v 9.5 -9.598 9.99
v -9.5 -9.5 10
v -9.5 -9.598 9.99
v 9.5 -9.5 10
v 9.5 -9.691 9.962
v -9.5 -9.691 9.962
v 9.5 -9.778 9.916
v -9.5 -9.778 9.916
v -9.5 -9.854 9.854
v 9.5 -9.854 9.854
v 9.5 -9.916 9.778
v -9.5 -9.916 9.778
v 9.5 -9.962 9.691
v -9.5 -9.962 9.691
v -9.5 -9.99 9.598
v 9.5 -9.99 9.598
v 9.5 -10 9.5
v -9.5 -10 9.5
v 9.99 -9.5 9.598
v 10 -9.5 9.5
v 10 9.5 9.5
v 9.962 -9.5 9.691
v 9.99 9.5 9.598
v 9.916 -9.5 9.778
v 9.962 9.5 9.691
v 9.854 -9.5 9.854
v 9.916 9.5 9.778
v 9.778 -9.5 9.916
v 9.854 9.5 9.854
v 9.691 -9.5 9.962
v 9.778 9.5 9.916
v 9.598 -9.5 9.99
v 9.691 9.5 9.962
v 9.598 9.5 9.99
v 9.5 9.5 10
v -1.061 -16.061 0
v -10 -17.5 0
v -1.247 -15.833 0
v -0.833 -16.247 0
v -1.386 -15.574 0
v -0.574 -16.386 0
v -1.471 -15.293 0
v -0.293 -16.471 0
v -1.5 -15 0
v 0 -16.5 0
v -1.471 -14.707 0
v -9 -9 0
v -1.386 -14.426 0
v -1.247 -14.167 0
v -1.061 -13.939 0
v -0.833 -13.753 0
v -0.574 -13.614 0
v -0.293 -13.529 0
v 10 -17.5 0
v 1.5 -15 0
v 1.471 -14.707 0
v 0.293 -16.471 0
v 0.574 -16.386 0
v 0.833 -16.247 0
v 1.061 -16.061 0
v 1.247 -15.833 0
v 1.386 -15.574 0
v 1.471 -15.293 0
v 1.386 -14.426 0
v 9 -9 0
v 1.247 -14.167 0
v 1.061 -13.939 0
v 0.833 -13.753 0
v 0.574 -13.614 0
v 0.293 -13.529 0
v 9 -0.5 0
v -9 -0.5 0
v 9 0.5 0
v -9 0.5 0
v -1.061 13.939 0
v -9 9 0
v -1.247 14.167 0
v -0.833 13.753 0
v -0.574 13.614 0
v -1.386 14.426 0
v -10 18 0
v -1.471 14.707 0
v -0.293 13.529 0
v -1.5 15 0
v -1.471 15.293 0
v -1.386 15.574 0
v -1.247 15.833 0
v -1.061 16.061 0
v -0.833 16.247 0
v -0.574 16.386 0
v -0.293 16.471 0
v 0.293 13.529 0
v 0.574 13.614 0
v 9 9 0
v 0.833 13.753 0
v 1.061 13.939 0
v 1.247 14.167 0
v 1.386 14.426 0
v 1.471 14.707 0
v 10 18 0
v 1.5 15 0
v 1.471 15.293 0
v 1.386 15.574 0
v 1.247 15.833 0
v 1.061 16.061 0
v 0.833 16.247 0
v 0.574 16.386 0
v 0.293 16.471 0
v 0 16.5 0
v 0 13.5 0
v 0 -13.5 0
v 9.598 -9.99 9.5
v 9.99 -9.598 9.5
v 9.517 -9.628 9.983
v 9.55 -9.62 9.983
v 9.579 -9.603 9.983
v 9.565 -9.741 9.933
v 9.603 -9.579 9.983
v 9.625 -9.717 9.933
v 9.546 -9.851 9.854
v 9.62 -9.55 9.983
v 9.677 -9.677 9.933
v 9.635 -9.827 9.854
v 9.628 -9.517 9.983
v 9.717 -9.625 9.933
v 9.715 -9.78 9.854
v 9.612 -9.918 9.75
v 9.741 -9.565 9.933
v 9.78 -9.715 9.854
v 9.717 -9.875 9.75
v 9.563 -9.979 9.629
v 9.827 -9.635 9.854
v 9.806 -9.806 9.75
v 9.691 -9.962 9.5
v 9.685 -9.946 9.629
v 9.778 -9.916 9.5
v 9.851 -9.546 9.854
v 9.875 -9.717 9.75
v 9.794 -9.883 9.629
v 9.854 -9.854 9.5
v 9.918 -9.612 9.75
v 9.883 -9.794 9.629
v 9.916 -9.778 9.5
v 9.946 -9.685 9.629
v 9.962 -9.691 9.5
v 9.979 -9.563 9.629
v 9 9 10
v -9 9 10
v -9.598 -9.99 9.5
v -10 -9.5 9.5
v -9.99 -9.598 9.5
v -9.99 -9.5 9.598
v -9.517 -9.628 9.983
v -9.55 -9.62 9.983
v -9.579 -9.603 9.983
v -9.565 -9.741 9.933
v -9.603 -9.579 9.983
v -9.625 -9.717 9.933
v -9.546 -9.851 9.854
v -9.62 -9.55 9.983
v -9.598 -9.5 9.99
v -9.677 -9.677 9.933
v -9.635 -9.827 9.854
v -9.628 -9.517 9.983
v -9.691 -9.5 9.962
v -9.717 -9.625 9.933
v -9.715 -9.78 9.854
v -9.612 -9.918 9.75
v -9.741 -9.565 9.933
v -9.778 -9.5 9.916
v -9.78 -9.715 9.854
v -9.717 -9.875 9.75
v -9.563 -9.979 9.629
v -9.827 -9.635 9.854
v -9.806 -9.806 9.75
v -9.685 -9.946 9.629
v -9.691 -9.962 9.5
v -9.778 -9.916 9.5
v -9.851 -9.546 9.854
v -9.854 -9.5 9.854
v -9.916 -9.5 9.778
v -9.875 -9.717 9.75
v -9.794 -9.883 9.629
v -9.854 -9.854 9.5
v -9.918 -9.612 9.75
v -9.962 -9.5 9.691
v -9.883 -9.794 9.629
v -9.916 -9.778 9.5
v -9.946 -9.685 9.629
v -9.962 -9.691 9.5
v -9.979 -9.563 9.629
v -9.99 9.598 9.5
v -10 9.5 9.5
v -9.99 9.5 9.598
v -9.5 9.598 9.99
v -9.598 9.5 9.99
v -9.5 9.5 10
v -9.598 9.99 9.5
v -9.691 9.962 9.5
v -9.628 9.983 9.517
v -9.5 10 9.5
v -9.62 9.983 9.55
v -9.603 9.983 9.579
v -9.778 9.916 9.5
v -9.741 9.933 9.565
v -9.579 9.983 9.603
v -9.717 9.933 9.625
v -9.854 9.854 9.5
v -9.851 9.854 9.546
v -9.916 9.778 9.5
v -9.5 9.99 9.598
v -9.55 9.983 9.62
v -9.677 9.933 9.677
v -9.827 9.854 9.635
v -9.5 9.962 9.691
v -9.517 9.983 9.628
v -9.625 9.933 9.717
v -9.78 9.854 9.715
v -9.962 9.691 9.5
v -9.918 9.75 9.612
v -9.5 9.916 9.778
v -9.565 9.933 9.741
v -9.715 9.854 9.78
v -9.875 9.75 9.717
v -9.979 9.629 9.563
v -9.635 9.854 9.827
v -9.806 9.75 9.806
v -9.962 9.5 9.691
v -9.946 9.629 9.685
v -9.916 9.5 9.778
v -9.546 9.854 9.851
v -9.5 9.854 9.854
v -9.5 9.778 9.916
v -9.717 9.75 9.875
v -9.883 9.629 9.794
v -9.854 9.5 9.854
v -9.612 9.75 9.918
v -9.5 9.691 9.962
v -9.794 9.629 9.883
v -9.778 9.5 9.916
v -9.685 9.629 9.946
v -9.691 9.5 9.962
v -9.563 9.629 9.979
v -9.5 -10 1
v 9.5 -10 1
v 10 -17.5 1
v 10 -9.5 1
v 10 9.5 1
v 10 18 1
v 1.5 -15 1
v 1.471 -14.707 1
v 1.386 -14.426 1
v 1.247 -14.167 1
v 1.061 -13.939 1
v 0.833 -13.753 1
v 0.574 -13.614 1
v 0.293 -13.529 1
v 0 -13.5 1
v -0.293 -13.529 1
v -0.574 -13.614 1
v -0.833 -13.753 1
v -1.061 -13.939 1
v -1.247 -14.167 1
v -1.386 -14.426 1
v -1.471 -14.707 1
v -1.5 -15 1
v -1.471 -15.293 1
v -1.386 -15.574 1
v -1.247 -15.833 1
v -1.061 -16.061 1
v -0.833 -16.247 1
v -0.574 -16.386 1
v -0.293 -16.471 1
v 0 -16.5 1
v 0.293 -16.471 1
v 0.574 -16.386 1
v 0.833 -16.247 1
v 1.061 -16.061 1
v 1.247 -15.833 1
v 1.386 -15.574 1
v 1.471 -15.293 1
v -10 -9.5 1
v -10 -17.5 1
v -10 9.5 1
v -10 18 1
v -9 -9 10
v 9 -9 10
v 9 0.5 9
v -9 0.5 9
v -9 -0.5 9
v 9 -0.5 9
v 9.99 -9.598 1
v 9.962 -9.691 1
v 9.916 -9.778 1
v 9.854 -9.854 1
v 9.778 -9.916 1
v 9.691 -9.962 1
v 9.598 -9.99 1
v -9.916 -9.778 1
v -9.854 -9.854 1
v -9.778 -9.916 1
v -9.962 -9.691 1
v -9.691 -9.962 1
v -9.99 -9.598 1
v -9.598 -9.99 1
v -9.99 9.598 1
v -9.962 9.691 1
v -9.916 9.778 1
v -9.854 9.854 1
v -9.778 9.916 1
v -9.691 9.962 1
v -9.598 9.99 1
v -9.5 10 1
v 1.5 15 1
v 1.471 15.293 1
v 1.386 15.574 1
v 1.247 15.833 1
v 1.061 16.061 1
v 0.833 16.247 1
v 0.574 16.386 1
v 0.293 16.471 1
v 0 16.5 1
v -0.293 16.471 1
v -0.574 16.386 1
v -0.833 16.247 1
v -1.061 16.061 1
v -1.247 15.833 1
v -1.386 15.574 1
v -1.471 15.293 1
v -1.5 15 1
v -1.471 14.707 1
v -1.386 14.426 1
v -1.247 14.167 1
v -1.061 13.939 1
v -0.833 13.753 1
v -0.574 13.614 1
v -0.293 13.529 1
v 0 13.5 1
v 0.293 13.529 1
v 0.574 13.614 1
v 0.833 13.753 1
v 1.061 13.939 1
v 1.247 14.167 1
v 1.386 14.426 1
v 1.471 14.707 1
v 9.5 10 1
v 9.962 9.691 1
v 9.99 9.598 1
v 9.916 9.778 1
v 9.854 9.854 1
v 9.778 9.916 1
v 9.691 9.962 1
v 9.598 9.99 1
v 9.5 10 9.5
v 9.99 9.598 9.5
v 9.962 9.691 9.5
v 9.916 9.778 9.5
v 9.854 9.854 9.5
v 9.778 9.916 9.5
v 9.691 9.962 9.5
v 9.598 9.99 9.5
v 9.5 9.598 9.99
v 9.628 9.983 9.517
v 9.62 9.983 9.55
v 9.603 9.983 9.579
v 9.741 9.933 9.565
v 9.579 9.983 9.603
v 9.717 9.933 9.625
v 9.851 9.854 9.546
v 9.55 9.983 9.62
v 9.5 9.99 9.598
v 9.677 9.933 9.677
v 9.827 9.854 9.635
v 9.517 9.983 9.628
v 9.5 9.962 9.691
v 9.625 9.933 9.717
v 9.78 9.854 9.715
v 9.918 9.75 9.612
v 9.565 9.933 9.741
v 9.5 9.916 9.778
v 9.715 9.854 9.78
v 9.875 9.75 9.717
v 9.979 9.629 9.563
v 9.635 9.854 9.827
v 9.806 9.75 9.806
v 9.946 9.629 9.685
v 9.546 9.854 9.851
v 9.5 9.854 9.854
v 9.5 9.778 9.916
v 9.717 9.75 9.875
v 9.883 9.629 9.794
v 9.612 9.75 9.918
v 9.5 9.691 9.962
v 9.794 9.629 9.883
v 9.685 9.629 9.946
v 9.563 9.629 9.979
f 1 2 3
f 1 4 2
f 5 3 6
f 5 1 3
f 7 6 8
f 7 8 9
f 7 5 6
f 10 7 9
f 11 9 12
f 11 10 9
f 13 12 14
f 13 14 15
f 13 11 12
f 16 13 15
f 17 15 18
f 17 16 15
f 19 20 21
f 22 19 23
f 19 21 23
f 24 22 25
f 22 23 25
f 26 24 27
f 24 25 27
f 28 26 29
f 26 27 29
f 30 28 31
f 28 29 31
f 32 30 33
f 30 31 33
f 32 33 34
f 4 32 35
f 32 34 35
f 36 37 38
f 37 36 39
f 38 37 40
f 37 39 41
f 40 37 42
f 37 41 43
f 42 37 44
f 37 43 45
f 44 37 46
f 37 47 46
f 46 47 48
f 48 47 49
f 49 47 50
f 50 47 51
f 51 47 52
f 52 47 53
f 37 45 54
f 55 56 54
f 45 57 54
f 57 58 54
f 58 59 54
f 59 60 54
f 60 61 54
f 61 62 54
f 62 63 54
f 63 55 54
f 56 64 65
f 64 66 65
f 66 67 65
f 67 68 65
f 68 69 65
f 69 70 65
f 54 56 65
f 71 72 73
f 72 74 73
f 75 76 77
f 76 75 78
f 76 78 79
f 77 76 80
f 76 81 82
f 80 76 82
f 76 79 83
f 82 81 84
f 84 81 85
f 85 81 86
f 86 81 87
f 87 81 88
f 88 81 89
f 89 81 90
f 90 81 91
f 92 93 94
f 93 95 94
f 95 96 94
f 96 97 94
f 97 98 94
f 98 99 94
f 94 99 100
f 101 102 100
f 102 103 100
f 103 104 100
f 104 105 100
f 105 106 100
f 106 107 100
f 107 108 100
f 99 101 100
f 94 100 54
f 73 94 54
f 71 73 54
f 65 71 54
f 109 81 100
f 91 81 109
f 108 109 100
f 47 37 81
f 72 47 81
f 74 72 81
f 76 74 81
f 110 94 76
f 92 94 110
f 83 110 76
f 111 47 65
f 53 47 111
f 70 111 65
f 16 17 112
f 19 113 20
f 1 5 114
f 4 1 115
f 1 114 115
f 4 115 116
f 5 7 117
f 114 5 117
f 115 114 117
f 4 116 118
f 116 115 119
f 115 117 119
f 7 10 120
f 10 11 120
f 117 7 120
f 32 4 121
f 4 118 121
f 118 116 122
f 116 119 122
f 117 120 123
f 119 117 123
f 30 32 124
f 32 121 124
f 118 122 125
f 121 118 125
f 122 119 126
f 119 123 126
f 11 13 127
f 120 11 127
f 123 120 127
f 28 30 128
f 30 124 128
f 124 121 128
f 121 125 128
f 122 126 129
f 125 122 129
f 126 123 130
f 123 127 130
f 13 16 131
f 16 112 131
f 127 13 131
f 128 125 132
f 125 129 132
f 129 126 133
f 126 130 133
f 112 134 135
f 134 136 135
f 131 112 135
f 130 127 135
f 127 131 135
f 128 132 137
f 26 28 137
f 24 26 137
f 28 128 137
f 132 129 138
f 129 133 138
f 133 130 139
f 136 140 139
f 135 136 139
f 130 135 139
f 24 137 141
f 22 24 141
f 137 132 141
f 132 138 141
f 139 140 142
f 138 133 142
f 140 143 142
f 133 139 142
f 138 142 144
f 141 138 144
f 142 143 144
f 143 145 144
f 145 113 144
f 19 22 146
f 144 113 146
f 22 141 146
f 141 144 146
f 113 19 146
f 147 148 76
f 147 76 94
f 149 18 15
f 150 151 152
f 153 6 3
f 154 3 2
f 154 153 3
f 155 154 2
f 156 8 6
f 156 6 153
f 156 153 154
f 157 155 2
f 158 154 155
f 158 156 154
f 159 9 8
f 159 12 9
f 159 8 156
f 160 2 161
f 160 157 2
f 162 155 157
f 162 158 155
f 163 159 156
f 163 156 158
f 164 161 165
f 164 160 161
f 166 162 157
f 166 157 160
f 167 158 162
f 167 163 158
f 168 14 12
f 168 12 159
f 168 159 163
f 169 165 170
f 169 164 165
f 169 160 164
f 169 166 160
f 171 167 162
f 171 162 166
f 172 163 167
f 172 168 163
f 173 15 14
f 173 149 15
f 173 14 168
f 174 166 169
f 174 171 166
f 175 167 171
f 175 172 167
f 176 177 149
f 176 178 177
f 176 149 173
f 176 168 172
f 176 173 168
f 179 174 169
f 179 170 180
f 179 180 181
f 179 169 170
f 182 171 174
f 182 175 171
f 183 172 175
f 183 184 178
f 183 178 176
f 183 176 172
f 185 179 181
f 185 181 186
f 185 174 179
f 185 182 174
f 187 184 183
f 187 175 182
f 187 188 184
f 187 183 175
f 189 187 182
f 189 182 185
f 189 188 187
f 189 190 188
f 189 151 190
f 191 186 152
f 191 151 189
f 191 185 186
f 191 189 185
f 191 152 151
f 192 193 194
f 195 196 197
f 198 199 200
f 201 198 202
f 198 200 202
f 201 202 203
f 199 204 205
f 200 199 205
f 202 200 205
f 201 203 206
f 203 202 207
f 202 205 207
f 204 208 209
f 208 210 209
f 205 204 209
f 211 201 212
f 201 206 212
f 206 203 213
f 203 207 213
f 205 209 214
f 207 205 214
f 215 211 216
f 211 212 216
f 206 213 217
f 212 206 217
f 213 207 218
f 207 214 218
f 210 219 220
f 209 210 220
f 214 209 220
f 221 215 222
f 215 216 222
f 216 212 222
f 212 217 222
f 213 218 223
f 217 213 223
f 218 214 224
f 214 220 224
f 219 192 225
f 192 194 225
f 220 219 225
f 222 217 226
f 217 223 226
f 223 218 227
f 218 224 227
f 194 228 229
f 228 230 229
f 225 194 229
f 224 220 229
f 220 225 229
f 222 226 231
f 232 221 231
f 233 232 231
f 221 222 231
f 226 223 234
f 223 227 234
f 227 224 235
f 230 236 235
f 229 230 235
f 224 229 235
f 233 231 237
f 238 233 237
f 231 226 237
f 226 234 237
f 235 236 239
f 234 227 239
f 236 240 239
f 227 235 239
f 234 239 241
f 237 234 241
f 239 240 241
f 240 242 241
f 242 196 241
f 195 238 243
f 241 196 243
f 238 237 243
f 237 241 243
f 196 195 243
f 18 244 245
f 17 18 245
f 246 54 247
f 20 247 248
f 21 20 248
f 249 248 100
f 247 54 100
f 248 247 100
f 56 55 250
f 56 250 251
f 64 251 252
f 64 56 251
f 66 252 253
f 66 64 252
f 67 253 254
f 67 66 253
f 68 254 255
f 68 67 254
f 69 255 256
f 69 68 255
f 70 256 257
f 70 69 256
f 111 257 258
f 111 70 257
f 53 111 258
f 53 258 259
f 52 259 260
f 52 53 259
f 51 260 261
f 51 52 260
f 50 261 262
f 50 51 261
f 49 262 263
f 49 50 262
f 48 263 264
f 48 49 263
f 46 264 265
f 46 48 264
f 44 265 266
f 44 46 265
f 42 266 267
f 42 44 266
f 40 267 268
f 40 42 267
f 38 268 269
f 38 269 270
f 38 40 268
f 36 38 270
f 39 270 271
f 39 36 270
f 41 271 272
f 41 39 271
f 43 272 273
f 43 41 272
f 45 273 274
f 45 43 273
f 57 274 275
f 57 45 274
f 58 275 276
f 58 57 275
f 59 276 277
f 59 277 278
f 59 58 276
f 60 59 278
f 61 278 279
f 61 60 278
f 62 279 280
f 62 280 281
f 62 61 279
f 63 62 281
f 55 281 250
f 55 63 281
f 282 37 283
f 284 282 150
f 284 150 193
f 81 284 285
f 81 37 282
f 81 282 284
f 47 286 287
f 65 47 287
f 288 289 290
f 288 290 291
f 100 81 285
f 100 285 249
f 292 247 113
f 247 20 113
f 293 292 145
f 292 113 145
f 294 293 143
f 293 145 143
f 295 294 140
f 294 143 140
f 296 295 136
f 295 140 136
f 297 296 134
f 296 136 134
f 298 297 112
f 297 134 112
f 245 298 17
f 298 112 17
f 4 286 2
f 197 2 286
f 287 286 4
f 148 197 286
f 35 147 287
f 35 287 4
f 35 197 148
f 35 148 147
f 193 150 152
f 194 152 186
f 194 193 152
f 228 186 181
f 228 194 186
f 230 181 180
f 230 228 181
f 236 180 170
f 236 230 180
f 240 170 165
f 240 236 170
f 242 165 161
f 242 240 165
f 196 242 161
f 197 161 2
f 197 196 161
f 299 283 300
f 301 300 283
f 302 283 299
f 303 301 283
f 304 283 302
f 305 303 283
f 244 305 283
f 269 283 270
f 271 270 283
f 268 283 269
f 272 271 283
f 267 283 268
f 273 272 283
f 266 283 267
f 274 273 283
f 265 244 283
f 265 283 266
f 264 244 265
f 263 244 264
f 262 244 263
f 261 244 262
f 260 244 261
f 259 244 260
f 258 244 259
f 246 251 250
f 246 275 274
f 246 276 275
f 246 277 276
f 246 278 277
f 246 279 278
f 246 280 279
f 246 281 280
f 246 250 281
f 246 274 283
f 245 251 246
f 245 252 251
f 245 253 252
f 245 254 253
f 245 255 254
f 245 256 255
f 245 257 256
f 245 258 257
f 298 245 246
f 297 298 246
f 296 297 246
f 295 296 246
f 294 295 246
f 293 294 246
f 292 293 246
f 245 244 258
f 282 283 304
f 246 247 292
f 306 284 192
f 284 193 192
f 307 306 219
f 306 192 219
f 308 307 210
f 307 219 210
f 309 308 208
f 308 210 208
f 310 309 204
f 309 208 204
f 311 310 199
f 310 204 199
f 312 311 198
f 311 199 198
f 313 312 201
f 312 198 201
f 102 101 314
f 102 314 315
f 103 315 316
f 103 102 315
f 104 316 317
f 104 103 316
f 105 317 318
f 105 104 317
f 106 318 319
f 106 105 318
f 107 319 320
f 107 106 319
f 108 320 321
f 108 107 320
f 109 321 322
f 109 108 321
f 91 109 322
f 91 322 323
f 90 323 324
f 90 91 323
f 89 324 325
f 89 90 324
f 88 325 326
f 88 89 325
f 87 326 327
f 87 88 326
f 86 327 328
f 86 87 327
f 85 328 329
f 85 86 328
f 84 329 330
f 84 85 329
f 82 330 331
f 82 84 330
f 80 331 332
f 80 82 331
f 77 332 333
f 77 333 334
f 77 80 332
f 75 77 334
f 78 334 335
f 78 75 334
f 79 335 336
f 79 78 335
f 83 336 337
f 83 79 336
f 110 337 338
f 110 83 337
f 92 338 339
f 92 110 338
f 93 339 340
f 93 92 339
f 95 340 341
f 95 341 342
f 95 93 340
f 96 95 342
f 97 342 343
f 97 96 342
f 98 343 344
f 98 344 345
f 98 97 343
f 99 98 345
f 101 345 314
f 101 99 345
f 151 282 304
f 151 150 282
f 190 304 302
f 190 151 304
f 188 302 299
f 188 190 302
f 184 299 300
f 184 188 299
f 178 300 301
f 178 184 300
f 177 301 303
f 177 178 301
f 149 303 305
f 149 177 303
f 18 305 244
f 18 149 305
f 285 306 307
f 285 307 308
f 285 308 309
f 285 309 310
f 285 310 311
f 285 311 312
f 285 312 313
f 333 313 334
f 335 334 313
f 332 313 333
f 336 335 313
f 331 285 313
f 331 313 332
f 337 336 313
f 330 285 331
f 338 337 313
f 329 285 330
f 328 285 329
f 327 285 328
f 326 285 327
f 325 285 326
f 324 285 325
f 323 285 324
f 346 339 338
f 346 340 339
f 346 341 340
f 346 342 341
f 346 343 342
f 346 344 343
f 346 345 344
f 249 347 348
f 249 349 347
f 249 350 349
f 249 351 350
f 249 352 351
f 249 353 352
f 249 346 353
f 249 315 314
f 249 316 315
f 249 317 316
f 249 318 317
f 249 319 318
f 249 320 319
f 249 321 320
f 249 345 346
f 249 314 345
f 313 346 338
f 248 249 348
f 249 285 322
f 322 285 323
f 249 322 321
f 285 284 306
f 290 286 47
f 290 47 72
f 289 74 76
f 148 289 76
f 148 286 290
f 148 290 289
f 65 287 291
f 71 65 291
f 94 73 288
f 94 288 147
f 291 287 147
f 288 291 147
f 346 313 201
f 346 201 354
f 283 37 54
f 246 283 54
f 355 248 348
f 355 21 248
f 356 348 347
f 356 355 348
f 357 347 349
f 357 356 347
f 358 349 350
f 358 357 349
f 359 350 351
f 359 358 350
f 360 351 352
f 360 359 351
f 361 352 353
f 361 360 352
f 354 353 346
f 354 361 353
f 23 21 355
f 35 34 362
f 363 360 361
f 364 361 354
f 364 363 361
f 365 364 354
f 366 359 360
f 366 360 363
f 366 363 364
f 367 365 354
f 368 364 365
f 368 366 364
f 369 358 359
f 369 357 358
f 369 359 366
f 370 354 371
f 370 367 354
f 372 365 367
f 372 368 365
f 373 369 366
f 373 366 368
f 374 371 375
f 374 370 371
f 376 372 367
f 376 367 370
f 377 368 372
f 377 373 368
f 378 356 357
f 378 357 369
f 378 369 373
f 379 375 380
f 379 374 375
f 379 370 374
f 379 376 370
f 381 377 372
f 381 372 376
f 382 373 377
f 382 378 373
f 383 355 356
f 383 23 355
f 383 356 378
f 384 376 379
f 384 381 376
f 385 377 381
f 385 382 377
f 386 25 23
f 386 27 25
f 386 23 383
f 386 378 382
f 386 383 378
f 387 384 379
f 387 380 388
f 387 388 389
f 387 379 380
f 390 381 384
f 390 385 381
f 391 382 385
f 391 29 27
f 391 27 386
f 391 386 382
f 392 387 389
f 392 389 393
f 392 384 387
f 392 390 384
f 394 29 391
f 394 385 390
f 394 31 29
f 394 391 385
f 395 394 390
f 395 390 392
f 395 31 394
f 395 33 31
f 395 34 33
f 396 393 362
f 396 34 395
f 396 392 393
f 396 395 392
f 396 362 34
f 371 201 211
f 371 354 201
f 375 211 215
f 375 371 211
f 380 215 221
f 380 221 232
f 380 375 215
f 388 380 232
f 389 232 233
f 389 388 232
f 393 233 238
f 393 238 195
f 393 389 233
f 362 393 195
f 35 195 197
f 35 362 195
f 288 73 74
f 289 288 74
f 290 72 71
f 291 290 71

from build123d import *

# Parameters (mm, degrees)
F0_W     = 20
F0_H     = 20
F1_DEPTH = 10
F2_T     = -1
F4_DEPTH = 9
F5_W     = 20
F5_H     = 8
F5_R     = 1.5
F6_DEPTH = 1
F7_W     = 18
F7_H     = 18
F8_DEPTH = 1
F9_R     = 0.5


with BuildPart() as f1:
    # F0 (on Top) → F1 (new body)
    with BuildSketch(Plane.XY):
        Rectangle(F0_W, F0_H)
    extrude(amount=F1_DEPTH)

    # F2
    f2_openings = [f1.faces().sort_by_distance(p)[0] for p in [
        (0, 0, 0),
    ]]
    offset(amount=F2_T, openings=f2_openings)

    # F3 (on Top) → F4 (join)
    with BuildSketch(Plane.XY):
        Polygon((9, -0.5), (9, 0.5), (0.5, 0.5), (-0.5, 0.5), (-9, 0.5), (-9, -0.5), (-0.5, -0.5), (0.5, -0.5), align=None)
    extrude(amount=F4_DEPTH)

    # F5 (on Top) → F6 (join)
    with BuildSketch(Plane.XY):
        with Locations((0, -13.5)):
            Rectangle(F5_W, F5_H)
        with Locations((0, -15)):
            Circle(F5_R, mode=Mode.SUBTRACT)
        with Locations((0, 14)):
            Rectangle(F5_W, F5_H)
        with Locations((0, 15)):
            Circle(F5_R, mode=Mode.SUBTRACT)
    extrude(amount=F6_DEPTH)

    # F7 (on face) → F8 (cut)
    with BuildSketch(Plane.XY.offset(10)):
        Rectangle(F7_W, F7_H)
    extrude(amount=-F8_DEPTH, mode=Mode.SUBTRACT)

    # F9
    f9_edges = [f1.edges().sort_by_distance(p)[0] for p in [
        (-10, -10, 5.5),
        (10, -10, 5.5),
        (0, -10, 10),
        (10, 0, 10),
        (-10, 0, 10),
        (10, 10, 5.5),
        (-10, 10, 5.5),
        (0, 10, 10),
    ]]
    fillet(f9_edges, radius=F9_R)


solid = f1.part
